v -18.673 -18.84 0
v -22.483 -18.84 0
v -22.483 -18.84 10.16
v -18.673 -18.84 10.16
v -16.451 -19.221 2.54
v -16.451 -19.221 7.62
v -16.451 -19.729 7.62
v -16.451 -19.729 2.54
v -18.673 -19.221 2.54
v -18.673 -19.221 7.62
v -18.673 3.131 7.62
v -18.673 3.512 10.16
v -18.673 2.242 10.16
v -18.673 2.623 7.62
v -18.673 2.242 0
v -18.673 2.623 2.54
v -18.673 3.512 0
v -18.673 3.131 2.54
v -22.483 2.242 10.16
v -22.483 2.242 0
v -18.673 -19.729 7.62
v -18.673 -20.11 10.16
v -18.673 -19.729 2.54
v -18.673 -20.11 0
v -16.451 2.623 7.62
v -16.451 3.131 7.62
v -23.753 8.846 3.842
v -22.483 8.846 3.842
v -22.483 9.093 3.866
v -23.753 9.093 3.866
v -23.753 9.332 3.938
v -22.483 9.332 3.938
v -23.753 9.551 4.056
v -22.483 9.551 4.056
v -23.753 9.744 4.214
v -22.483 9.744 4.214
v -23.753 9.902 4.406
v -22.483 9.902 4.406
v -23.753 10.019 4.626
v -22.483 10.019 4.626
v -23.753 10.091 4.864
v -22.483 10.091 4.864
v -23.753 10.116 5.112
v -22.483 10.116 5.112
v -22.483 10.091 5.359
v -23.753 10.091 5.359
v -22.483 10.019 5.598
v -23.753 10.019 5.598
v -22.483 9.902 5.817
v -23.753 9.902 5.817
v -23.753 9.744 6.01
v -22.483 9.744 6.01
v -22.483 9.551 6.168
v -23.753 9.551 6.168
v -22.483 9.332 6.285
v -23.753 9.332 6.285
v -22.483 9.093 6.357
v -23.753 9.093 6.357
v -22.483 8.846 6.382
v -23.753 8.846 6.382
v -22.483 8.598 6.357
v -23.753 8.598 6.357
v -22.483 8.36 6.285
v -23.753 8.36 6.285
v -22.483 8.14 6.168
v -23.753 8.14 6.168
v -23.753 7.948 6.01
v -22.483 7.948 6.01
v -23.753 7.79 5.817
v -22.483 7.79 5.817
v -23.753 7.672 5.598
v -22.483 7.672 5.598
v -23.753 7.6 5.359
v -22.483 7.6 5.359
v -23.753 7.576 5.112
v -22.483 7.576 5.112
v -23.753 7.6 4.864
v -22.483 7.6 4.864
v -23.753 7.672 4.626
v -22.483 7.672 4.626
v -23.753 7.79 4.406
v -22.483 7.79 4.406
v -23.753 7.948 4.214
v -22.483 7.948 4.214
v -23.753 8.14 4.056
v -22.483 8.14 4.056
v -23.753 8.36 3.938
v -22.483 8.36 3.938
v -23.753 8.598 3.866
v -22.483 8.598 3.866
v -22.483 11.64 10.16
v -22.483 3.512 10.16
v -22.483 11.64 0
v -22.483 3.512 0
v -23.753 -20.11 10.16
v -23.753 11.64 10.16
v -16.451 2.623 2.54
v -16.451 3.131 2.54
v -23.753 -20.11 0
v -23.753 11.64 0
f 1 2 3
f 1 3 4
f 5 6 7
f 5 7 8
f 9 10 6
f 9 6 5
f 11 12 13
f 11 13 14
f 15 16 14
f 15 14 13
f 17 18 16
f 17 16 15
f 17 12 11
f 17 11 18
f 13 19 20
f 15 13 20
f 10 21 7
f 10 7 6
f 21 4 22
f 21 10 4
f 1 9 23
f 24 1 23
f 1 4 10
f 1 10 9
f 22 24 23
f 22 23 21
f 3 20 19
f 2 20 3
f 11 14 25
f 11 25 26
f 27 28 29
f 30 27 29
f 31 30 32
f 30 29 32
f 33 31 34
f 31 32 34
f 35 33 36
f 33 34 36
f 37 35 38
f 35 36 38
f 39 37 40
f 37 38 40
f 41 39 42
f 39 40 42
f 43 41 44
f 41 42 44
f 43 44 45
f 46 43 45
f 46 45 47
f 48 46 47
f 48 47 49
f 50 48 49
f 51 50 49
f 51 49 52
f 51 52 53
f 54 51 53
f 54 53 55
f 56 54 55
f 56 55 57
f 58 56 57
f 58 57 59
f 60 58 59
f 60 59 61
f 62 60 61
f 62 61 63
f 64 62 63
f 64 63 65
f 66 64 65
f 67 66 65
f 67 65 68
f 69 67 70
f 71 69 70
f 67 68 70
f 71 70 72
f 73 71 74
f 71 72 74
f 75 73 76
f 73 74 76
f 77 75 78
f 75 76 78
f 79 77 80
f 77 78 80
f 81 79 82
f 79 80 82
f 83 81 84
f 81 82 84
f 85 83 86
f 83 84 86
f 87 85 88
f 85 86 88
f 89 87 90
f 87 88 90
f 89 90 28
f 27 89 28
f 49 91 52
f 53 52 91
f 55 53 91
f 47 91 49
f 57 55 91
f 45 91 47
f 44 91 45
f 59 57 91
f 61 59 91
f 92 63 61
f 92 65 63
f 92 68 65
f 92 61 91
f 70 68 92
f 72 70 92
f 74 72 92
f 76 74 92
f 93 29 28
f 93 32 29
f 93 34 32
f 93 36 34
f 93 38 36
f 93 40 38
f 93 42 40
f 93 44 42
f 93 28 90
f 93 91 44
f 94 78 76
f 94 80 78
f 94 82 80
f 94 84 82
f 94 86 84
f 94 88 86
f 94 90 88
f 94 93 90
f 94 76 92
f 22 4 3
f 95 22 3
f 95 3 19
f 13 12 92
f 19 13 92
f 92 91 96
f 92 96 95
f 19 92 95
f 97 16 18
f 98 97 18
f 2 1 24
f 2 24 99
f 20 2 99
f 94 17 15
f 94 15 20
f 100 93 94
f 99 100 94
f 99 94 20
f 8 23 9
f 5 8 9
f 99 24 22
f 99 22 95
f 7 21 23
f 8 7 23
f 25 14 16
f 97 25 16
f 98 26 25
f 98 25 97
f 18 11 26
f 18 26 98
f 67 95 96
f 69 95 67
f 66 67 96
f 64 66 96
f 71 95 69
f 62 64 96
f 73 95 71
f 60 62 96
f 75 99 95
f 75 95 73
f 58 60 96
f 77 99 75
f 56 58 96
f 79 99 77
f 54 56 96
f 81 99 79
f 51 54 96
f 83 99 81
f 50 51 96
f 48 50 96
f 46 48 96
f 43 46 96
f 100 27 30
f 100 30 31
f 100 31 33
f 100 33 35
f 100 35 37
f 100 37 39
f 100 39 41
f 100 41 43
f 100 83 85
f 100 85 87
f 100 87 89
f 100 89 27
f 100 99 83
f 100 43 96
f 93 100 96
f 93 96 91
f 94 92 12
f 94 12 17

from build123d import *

# Parameters (mm, degrees)
BOSS_EXTRUDE1_DEPTH = 10.16
SKETCH6_W           = 10.16
SKETCH6_H           = 1.27
BOSS_EXTRUDE3_DEPTH = 3.81
SKETCH23_W          = 5.08
SKETCH23_H          = 0.508
BOSS_EXTRUDE4_DEPTH = 2.2225
SKETCH25_W          = 5.08
SKETCH25_H          = 0.508
BOSS_EXTRUDE5_DEPTH = 2.2225
SKETCH26_R          = 1.27
CUT_EXTRUDE1_DEPTH  = 2.2225


with BuildPart() as part:
    # Sketch1 → Boss-Extrude1 (new body)
    with BuildSketch(Plane.XY):
        Polygon((-22.483233333, 11.63955), (-22.483233333, -18.84045), (-18.673233333, -18.84045), (-18.673233333, -20.11045), (-23.753233333, -20.11045), (-23.753233333, 11.63955), align=None)
    extrude(amount=BOSS_EXTRUDE1_DEPTH)

    # Sketch6 → Boss-Extrude3 (add)
    with BuildSketch(Plane(origin=(-22.483233333, 0, 0), x_dir=(0, 0, -1), z_dir=(1, 0, 0))):
        with Locations((-5.08, 2.87655)):
            Rectangle(SKETCH6_W, SKETCH6_H)
    extrude(amount=BOSS_EXTRUDE3_DEPTH)

    # Sketch23 → Boss-Extrude4 (add)
    with BuildSketch(Plane(origin=(-18.673233333, 0, 0), x_dir=(0, 0, -1), z_dir=(1, 0, 0))):
        with Locations((-5.08, 2.87655)):
            Rectangle(SKETCH23_W, SKETCH23_H)
    extrude(amount=BOSS_EXTRUDE4_DEPTH)

    # Sketch25 → Boss-Extrude5 (add)
    with BuildSketch(Plane(origin=(-18.673233333, 0, 0), x_dir=(0, 0, -1), z_dir=(1, 0, 0))):
        with Locations((-5.08, -19.47545)):
            Rectangle(SKETCH25_W, SKETCH25_H)
    extrude(amount=BOSS_EXTRUDE5_DEPTH)

    # Sketch26 → Cut-Extrude1 (cut)
    with BuildSketch(Plane(origin=(-22.483233333, 0, 0), x_dir=(0, 0, -1), z_dir=(1, 0, 0))):
        with Locations((-5.111682079, 8.84555)):
            Circle(SKETCH26_R)
    extrude(amount=-CUT_EXTRUDE1_DEPTH, mode=Mode.SUBTRACT)


solid = part.part
